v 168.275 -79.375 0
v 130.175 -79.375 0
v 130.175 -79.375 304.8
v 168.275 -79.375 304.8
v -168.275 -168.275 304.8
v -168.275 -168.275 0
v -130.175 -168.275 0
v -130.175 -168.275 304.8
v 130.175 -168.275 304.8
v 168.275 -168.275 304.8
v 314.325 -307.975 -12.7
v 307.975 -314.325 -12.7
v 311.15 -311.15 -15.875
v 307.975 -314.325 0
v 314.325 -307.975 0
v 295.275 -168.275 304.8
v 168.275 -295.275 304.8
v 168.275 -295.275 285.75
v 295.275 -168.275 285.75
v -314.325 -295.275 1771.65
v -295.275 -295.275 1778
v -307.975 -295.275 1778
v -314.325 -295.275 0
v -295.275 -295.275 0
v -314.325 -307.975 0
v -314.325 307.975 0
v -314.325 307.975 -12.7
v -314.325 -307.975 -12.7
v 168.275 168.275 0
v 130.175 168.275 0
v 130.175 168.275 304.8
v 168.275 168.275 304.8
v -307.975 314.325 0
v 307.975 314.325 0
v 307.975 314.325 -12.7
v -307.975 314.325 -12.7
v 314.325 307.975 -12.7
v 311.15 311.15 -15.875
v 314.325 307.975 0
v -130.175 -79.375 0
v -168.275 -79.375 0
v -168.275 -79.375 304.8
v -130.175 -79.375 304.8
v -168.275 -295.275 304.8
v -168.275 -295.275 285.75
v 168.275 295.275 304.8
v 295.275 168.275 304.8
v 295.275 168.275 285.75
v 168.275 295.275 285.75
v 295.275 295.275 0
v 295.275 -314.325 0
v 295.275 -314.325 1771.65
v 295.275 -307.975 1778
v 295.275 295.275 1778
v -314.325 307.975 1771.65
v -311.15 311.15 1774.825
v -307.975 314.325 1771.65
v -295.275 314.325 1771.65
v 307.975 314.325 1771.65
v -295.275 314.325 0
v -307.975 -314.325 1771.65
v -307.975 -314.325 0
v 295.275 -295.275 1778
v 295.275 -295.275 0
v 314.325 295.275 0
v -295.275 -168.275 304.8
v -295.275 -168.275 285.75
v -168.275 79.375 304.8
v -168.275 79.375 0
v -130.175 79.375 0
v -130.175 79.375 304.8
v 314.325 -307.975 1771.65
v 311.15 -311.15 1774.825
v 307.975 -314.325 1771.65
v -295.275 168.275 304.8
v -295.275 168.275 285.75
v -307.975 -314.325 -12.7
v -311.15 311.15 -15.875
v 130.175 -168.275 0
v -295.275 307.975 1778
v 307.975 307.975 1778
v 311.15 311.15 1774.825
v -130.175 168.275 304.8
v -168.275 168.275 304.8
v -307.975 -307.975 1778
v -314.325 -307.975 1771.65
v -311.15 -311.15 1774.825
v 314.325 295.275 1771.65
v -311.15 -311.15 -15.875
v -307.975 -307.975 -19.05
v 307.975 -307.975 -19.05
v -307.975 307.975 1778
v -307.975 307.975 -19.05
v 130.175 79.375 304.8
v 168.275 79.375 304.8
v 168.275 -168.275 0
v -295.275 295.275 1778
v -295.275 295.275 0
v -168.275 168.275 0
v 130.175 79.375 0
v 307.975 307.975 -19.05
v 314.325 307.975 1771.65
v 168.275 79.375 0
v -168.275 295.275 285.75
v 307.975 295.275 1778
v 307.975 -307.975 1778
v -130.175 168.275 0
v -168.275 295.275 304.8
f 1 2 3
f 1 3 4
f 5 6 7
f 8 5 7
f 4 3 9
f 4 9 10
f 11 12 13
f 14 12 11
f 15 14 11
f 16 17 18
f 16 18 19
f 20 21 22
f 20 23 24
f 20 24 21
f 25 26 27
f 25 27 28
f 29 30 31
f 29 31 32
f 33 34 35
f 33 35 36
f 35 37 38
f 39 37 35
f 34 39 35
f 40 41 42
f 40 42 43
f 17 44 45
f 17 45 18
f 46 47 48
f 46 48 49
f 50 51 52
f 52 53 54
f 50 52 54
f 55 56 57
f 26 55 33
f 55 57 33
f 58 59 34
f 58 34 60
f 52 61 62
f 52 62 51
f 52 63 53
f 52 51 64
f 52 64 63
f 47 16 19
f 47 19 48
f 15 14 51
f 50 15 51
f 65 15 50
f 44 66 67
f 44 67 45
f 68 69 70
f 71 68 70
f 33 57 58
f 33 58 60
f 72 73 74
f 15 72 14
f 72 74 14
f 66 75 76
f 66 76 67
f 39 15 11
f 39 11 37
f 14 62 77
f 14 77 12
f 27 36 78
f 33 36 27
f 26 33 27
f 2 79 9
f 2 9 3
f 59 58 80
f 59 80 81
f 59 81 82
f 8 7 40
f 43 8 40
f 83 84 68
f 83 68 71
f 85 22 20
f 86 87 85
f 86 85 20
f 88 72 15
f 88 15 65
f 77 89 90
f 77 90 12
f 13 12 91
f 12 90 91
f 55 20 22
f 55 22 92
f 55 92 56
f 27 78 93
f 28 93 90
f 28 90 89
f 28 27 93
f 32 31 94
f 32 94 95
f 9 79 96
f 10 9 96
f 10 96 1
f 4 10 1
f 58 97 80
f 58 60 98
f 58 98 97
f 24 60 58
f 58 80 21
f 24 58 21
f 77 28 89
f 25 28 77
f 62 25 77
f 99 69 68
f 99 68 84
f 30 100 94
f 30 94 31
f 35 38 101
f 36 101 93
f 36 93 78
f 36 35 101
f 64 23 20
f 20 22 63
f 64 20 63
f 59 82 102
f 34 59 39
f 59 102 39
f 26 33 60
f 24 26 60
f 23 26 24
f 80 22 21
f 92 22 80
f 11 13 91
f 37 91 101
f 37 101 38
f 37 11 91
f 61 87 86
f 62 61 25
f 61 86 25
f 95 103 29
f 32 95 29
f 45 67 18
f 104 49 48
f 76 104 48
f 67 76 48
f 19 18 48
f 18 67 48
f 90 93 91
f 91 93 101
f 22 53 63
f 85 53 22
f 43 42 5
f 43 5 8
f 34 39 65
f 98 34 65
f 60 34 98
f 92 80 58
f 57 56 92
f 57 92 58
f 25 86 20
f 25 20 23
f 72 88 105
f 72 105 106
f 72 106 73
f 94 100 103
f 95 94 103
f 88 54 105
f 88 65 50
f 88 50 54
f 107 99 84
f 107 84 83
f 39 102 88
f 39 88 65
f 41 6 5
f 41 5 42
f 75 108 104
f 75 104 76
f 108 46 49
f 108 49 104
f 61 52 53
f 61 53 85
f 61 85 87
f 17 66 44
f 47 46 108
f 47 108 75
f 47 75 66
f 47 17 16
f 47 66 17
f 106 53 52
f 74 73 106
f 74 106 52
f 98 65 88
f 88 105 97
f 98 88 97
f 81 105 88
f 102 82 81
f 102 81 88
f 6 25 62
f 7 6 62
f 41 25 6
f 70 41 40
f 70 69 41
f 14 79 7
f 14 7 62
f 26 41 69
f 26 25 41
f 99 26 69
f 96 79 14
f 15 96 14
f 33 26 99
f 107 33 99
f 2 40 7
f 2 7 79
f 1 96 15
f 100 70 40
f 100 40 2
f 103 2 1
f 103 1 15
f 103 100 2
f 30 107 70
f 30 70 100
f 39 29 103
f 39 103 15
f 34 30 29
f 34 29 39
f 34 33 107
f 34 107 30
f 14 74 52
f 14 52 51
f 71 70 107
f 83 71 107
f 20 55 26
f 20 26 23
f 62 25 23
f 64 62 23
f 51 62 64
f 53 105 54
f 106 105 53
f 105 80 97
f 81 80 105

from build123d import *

# Parameters (mm, degrees)
F1_DEPTH   = 19.05
F3_DEPTH   = 19.05
F5_DEPTH   = 19.05
F7_DEPTH   = 19.05
F9_DEPTH   = 19.05
F10_SIZE   = 6.35
F10_2_SIZE = 6.35
F10_3_SIZE = 6.35
F10_4_SIZE = 6.35
F11_SIZE   = 6.35
F12_SIZE   = 6.35
F13_SIZE   = 6.35
F14_SIZE   = 6.35
F15_SIZE   = 6.35
F16_W      = 38.1
F16_H      = 88.9
F17_DEPTH  = 304.8
F19_DEPTH  = 19.05


with BuildPart() as f1:
    # F0 (on Top) → F1 (new body)
    with BuildSketch(Plane.XY):
        Polygon((-307.975, -314.325), (307.975, -314.325), (314.325, -307.975), (314.325, 307.975), (307.975, 314.325), (-307.975, 314.325), (-314.325, 307.975), (-314.325, -307.975), align=None)
    extrude(amount=-F1_DEPTH)

    # F15 (call 1 of 4: OpenCascade refuses the feature's edges together)
    f15_edges = [f1.edges().sort_by_distance(p)[0] for p in [
        (0, -314.325, -19.05),
    ]]
    chamfer(f15_edges, length=F15_SIZE)

    # F15#2 (call 2 of 4)
    f15_2_edges = [f1.edges().sort_by_distance(p)[0] for p in [
        (314.325, 0, -19.05),
    ]]
    chamfer(f15_2_edges, length=F15_SIZE)

    # F15#3 (call 3 of 4)
    f15_3_edges = [f1.edges().sort_by_distance(p)[0] for p in [
        (0, 314.325, -19.05),
    ]]
    chamfer(f15_3_edges, length=F15_SIZE)

    # F15#4 (call 4 of 4)
    f15_4_edges = [f1.edges().sort_by_distance(p)[0] for p in [
        (-314.325, 0, -19.05),
    ]]
    chamfer(f15_4_edges, length=F15_SIZE)

    # F16 (on face) → F17 (join)
    with BuildSketch(Plane.XY):
        with Locations((-149.225, 123.825)):
            Rectangle(F16_W, F16_H)
        with Locations((149.225, 123.825)):
            Rectangle(F16_W, F16_H)
        with Locations((-149.225, -123.825)):
            Rectangle(F16_W, F16_H)
        with Locations((149.225, -123.825)):
            Rectangle(F16_W, F16_H)
    extrude(amount=F17_DEPTH)


with BuildPart() as f3:
    # F2 (on face) → F3 (new body)
    with BuildSketch(Plane.XZ.offset(314.325)):
        Polygon((-314.325, 1771.65), (-314.325, 0), (295.275, 0), (295.275, 1778), (-307.975, 1778), align=None)
    extrude(amount=-F3_DEPTH)

    # F10#2
    f10_2_edges = [f3.edges().sort_by_distance(p)[0] for p in [
        (-6.35, -314.325, 1778),
    ]]
    chamfer(f10_2_edges, length=F10_2_SIZE)

    # F11
    f11_edges = [f3.edges().sort_by_distance(p)[0] for p in [
        (-314.325, -314.325, 885.825),
    ]]
    chamfer(f11_edges, length=F11_SIZE)


with BuildPart() as f5:
    # F4 (on face) → F5 (new body)
    with BuildSketch(Plane(origin=(0, 314.325, 0), x_dir=(-1, 0, 0), z_dir=(0, 1, 0))):
        Polygon((-314.325, 1771.65), (-314.325, 0), (295.275, 0), (295.275, 1778), (-307.975, 1778), align=None)
    extrude(amount=-F5_DEPTH)

    # F10#3
    f10_3_edges = [f5.edges().sort_by_distance(p)[0] for p in [
        (6.35, 314.325, 1778),
    ]]
    chamfer(f10_3_edges, length=F10_3_SIZE)

    # F13
    f13_edges = [f5.edges().sort_by_distance(p)[0] for p in [
        (314.325, 314.325, 885.825),
    ]]
    chamfer(f13_edges, length=F13_SIZE)


with BuildPart() as f7:
    # F6 (on face) → F7 (new body)
    with BuildSketch(Plane.YZ.offset(314.325)):
        Polygon((295.275, 1778), (-307.975, 1778), (-314.325, 1771.65), (-314.325, 0), (295.275, 0), align=None)
    extrude(amount=-F7_DEPTH)

    # F10
    f10_edges = [f7.edges().sort_by_distance(p)[0] for p in [
        (314.325, -6.35, 1778),
    ]]
    chamfer(f10_edges, length=F10_SIZE)

    # F12
    f12_edges = [f7.edges().sort_by_distance(p)[0] for p in [
        (314.325, -314.325, 885.825),
    ]]
    chamfer(f12_edges, length=F12_SIZE)


with BuildPart() as f9:
    # F8 (on face) → F9 (new body)
    with BuildSketch(Plane(origin=(-314.325, 0, 0), x_dir=(0, -1, 0), z_dir=(-1, 0, 0))):
        Polygon((295.275, 1778), (-307.975, 1778), (-314.325, 1771.65), (-314.325, 0), (295.275, 0), align=None)
    extrude(amount=-F9_DEPTH)

    # F10#4
    f10_4_edges = [f9.edges().sort_by_distance(p)[0] for p in [
        (-314.325, 6.35, 1778),
    ]]
    chamfer(f10_4_edges, length=F10_4_SIZE)

    # F14
    f14_edges = [f9.edges().sort_by_distance(p)[0] for p in [
        (-314.325, 314.325, 885.825),
    ]]
    chamfer(f14_edges, length=F14_SIZE)


with BuildPart() as f19:
    # F18 (on face) → F19 (new body)
    with BuildSketch(Plane.XY.offset(304.8)):
        Polygon((168.275, 295.275), (-168.275, 295.275), (-295.275, 168.275), (-295.275, -168.275), (-168.275, -295.275), (168.275, -295.275), (295.275, -168.275), (295.275, 168.275), align=None)
    extrude(amount=-F19_DEPTH)


solid = Compound([f1.part, f3.part, f5.part, f7.part, f9.part, f19.part])
